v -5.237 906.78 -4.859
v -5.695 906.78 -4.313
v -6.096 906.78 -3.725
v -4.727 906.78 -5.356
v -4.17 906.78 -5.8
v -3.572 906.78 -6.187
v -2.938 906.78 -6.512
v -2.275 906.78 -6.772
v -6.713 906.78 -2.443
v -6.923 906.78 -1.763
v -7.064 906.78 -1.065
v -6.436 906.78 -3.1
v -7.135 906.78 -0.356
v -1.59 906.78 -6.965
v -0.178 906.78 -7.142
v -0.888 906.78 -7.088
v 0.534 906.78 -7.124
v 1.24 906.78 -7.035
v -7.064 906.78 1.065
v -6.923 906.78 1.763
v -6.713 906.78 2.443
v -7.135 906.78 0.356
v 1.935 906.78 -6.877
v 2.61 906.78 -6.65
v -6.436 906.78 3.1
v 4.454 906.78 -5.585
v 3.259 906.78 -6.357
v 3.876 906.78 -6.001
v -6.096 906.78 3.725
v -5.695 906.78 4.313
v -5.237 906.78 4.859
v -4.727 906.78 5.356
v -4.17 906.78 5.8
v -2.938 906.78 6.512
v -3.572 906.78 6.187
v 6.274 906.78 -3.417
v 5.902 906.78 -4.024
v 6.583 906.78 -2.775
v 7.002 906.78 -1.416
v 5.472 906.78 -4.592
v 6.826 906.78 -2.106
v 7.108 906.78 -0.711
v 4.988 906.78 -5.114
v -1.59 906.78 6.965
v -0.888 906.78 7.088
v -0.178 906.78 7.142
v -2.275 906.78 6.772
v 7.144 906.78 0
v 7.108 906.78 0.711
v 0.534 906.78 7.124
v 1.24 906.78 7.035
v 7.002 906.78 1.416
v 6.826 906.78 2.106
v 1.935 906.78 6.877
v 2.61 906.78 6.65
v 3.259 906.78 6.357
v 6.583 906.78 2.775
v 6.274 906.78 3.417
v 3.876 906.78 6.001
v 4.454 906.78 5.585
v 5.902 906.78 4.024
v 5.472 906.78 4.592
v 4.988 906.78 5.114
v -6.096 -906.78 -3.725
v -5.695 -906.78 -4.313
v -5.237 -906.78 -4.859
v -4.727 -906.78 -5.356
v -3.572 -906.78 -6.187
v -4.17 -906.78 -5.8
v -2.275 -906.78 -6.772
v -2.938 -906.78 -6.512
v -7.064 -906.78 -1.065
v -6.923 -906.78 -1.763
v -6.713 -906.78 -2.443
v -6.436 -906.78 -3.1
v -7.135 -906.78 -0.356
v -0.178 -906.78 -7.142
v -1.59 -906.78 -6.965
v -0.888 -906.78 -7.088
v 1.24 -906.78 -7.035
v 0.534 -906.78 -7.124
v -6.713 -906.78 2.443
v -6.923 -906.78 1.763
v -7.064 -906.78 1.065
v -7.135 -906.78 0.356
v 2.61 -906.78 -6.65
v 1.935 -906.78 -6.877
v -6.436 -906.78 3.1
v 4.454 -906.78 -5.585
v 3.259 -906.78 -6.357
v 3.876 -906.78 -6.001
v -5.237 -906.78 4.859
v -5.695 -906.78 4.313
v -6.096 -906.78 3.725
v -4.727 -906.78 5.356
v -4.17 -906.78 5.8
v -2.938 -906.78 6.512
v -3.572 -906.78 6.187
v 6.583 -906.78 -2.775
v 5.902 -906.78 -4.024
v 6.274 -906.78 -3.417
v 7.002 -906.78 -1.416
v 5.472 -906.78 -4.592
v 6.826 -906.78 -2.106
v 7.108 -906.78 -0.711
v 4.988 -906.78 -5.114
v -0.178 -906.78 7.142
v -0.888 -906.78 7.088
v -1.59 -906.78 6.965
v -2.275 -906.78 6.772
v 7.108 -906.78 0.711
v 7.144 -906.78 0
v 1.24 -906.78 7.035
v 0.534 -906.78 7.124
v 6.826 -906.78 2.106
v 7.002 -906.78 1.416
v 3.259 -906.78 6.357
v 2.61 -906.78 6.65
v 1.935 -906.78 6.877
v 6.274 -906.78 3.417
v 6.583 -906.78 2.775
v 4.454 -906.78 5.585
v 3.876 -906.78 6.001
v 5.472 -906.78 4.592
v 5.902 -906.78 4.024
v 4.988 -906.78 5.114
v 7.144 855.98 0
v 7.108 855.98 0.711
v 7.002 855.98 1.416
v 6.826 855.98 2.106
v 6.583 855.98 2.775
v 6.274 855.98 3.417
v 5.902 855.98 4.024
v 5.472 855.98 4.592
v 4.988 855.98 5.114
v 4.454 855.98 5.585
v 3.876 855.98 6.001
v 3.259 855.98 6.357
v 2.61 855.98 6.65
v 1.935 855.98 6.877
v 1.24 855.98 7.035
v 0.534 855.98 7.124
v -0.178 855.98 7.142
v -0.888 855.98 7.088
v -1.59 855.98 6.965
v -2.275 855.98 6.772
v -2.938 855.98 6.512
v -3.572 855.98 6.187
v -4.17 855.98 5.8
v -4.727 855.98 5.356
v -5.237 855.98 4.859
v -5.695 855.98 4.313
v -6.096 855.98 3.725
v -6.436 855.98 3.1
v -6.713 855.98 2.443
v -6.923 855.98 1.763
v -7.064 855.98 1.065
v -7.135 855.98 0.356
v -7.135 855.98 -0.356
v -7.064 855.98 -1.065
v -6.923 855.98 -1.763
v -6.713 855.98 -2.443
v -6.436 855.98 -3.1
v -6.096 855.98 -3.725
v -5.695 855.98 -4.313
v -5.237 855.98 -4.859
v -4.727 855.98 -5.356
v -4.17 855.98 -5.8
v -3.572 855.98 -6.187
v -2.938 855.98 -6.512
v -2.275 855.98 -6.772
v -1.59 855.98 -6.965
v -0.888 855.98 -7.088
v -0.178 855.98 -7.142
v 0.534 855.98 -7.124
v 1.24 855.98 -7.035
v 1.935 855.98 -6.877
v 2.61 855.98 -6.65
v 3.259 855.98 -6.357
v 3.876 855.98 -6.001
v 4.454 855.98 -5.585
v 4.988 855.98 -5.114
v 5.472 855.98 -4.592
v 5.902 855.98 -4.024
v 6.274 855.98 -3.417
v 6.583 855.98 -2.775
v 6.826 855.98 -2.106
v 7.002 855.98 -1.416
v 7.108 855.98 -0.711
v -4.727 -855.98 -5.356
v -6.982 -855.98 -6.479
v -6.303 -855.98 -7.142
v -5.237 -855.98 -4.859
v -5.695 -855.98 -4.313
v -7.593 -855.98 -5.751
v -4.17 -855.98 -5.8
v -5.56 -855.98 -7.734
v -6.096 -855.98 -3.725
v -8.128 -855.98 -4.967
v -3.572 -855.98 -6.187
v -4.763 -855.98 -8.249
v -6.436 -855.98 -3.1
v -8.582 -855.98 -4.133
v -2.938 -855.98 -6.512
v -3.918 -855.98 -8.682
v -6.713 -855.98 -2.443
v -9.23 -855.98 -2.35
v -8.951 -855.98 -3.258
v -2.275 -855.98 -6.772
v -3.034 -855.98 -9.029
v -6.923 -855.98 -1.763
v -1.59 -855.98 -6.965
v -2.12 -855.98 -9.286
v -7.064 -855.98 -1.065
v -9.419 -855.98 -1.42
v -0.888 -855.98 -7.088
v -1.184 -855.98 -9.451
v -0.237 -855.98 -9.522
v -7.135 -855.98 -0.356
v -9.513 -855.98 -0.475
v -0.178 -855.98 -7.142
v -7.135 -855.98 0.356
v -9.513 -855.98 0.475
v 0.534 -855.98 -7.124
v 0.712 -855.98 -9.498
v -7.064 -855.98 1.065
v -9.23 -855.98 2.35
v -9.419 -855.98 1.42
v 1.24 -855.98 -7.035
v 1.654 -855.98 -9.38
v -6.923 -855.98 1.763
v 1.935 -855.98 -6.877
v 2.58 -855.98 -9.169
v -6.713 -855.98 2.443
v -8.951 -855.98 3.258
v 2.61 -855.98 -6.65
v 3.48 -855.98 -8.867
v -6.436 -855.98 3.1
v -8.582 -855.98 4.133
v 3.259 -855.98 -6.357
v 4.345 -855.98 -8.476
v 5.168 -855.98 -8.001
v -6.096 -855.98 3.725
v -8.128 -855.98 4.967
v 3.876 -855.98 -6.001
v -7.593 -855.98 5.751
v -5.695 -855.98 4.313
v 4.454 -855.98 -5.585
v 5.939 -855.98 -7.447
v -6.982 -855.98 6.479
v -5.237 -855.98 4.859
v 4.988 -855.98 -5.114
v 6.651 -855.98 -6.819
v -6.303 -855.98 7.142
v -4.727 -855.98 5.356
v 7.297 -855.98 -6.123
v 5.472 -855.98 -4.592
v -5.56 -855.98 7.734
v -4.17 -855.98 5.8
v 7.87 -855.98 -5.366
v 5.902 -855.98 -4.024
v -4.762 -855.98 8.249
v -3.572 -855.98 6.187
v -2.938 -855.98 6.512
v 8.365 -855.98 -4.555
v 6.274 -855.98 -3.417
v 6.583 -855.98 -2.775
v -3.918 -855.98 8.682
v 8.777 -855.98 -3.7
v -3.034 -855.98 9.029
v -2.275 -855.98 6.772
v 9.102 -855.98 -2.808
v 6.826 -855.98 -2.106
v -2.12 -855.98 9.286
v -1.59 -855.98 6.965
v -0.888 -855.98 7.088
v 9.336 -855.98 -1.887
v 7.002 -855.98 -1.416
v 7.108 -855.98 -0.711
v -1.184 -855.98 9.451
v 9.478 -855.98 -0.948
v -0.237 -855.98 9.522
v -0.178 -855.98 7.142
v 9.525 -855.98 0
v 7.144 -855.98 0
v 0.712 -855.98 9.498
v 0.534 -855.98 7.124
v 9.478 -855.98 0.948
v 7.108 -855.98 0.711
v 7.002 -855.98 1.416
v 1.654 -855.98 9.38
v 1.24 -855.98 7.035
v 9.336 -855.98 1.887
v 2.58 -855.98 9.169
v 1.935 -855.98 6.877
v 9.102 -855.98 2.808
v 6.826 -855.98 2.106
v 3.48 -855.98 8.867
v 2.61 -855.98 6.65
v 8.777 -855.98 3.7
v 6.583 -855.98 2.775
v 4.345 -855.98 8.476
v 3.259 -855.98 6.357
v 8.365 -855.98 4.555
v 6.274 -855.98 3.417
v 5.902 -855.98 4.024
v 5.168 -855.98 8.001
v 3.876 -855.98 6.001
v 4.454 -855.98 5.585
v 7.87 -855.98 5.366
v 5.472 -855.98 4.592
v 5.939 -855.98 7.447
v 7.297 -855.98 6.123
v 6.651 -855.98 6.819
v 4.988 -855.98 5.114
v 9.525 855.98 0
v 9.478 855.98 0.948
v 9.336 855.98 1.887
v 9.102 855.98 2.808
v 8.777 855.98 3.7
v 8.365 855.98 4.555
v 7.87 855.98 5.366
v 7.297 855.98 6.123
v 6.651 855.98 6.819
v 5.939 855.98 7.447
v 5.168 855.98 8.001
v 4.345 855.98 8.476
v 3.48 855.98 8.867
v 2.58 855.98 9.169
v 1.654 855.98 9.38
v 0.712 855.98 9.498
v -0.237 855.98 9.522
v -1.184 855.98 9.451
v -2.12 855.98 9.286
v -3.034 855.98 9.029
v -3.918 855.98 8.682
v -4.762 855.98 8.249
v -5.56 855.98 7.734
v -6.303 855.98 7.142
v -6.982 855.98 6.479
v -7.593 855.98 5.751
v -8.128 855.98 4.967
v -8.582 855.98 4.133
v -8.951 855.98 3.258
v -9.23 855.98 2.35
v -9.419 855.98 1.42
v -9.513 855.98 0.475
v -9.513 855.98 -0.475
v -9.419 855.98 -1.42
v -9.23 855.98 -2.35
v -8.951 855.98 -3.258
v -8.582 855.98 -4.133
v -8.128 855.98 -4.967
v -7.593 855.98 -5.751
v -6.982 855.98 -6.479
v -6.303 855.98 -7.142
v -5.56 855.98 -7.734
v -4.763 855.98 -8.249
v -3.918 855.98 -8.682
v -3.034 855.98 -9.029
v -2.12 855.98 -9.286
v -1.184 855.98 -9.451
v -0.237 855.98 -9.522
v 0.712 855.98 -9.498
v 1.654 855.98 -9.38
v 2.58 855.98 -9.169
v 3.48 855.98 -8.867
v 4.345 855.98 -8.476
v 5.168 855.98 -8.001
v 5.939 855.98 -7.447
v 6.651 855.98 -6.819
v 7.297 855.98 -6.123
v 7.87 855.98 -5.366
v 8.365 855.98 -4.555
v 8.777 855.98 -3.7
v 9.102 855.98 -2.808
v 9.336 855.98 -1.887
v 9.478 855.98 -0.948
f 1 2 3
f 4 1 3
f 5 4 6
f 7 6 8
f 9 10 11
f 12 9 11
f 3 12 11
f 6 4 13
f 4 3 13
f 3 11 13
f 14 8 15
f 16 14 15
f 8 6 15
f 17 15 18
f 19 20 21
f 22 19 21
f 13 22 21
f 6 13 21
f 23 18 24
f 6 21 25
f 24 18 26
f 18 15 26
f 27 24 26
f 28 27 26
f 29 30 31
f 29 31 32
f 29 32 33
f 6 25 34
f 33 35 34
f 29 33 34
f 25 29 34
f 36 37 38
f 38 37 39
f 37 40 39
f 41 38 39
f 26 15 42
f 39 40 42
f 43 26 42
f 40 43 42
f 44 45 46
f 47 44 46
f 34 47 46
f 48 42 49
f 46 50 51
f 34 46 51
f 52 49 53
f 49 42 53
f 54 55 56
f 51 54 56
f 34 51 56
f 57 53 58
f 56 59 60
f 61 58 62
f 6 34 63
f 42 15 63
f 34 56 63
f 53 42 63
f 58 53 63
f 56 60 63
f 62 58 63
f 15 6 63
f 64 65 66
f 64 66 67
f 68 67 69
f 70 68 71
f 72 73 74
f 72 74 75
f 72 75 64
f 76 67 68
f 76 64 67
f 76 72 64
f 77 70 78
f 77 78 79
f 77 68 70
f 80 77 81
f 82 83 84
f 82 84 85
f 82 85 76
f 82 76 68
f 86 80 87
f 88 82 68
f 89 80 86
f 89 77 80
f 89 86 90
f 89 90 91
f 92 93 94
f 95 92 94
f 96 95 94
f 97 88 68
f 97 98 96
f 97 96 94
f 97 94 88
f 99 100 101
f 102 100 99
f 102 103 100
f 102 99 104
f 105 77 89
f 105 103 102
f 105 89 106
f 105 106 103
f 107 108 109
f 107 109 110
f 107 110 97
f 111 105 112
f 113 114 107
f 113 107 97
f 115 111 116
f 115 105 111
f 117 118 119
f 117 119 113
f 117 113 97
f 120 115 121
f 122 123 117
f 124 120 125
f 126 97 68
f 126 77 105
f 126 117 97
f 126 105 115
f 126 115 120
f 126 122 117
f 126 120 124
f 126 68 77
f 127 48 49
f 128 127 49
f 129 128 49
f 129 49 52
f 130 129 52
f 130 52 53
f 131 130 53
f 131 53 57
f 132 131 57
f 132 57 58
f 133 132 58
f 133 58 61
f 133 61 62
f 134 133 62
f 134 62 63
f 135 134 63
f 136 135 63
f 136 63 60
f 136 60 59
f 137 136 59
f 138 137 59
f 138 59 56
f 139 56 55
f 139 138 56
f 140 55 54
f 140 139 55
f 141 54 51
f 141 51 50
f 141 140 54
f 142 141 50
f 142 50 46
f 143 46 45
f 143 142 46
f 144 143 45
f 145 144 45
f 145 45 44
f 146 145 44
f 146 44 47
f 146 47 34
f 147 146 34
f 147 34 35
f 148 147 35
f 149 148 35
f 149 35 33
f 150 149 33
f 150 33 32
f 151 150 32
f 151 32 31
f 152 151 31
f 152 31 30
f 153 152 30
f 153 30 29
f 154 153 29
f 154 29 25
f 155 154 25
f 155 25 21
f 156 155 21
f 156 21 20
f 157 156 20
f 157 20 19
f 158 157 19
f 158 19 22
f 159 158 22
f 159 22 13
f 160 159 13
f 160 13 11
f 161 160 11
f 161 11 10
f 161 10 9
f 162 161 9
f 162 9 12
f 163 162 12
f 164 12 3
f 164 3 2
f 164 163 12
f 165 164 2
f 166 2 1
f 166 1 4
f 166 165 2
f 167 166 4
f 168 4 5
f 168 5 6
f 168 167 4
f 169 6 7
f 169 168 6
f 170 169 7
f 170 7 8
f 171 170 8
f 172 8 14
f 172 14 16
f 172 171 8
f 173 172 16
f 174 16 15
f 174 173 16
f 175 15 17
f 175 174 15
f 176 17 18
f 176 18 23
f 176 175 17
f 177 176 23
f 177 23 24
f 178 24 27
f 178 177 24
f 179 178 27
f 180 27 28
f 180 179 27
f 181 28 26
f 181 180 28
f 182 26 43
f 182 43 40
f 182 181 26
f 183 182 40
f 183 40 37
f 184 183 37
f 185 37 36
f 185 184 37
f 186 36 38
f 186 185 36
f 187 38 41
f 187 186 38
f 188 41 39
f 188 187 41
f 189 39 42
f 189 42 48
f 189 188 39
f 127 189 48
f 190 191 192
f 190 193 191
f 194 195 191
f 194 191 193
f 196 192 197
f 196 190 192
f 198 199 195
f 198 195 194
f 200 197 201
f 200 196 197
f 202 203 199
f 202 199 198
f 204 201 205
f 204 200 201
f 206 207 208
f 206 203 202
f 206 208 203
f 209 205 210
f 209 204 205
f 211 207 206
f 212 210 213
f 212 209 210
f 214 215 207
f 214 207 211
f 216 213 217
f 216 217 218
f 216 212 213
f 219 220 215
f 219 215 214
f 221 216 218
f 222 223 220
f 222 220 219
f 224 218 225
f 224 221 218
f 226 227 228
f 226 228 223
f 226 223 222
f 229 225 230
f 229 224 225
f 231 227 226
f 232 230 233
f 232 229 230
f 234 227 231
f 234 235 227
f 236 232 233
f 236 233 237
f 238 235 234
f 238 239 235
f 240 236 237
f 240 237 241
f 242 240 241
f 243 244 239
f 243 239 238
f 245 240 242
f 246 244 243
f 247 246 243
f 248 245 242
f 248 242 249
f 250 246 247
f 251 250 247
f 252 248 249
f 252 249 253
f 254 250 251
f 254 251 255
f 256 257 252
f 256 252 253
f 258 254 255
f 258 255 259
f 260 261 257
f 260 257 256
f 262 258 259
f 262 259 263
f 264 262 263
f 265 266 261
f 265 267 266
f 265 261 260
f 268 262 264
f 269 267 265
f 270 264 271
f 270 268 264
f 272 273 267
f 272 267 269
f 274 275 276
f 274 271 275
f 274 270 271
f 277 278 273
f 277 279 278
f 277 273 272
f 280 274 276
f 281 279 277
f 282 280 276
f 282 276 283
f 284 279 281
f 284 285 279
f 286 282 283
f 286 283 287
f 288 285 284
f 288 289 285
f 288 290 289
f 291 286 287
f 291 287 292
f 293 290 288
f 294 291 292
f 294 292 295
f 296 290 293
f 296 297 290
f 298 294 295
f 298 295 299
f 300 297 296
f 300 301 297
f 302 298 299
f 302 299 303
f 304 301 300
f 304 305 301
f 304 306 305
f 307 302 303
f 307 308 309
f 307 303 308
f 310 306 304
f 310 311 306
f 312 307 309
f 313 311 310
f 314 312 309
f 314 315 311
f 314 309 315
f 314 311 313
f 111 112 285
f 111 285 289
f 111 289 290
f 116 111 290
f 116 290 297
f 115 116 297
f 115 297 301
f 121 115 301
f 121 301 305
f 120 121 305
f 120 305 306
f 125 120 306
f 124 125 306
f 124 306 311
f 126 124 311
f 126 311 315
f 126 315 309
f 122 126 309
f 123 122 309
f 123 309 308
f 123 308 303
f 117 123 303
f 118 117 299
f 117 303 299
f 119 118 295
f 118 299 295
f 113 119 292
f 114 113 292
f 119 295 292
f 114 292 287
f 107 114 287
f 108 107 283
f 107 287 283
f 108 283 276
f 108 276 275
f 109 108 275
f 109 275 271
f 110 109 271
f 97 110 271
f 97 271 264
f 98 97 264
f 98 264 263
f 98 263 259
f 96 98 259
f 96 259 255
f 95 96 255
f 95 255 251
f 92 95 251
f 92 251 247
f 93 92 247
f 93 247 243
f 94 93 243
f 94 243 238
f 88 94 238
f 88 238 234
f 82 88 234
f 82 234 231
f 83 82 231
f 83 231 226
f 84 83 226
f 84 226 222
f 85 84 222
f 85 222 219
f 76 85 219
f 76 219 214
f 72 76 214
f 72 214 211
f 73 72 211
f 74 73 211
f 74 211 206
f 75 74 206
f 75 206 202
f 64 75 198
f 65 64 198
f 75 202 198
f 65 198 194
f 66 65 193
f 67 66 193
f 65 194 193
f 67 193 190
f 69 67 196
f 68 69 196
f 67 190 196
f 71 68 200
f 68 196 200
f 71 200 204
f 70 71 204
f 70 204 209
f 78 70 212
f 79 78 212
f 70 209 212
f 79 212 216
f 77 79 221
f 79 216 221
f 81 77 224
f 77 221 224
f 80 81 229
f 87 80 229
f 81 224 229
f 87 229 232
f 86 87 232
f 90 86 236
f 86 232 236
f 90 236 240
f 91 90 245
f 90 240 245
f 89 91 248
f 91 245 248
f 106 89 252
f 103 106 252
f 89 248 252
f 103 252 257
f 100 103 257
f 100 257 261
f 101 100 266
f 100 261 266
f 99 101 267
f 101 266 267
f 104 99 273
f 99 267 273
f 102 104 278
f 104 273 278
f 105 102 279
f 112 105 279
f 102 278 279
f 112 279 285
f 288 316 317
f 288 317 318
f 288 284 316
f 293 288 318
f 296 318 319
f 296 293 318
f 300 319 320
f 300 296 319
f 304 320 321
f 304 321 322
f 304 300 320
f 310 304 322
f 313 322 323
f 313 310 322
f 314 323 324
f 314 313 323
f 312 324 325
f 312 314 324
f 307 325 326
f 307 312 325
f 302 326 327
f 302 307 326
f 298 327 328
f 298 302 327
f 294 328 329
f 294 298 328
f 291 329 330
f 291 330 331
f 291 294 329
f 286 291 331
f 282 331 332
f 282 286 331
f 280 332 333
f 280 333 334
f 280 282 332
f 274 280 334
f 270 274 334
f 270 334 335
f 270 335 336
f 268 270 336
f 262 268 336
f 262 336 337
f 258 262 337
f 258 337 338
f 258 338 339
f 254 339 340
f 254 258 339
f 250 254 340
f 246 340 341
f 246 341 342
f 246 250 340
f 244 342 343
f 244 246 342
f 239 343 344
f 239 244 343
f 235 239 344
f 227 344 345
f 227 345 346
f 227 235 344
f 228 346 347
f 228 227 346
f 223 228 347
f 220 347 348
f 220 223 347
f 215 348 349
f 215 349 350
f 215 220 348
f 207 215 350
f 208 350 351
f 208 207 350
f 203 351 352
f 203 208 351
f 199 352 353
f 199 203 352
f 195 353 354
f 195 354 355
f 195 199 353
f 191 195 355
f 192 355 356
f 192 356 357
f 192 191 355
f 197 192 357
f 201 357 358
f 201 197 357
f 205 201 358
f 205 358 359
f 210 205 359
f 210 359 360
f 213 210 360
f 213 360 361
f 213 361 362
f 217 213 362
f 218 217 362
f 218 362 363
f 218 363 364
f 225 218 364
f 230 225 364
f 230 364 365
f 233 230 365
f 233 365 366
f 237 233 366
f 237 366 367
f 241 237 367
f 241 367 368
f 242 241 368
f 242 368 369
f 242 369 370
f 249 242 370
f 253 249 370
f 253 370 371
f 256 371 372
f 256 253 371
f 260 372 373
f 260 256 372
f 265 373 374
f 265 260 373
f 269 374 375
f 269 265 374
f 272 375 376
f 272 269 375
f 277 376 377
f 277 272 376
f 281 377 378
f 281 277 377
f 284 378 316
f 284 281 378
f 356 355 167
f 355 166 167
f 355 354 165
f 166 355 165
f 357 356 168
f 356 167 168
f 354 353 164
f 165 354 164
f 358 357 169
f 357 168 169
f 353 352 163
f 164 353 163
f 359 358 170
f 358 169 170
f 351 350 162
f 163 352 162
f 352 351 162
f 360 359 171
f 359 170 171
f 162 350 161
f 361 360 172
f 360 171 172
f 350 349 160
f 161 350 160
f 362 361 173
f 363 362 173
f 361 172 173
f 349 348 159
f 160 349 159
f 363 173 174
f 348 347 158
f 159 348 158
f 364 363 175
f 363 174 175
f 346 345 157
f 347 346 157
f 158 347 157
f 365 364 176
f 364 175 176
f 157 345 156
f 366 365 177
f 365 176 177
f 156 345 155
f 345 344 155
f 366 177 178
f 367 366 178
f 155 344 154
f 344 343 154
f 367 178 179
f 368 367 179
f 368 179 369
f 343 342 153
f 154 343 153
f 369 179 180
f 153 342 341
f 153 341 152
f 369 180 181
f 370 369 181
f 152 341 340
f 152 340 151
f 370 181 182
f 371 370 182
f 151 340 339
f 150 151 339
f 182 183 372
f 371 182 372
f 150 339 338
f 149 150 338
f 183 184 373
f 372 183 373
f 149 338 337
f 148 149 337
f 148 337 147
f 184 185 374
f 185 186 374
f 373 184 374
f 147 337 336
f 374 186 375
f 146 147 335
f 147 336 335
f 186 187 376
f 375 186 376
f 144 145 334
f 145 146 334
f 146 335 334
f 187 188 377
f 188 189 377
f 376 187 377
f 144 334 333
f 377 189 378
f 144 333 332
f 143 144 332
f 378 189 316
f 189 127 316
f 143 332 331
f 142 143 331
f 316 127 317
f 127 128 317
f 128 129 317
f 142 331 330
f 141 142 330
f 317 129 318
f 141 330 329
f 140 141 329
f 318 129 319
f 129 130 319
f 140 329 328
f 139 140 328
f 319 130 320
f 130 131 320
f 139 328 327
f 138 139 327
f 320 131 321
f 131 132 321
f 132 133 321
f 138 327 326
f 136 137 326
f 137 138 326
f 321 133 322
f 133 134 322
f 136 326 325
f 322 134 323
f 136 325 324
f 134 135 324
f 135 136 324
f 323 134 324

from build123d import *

# Parameters (mm, degrees)
F0_R          = 9.525
F0_R_2        = 7.14375
F1_DEPTH      = 855.98
F1_DEPTH_BACK = 855.98
F2_R          = 7.14375
F3_DEPTH      = 906.78
F3_DEPTH_BACK = 906.78


# Not quite as in the source:
# - a feature names something its author has since deleted; it is built from what else it names


with BuildPart() as f1:
    # F0 (on Front) → F1 (new body, two sides)
    with BuildSketch(Plane.XZ) as f1_sk:
        Circle(F0_R)
        Circle(F0_R_2, mode=Mode.SUBTRACT)
    extrude(amount=F1_DEPTH)
    extrude(f1_sk.sketch, amount=-F1_DEPTH_BACK)

    # F2 (on Front) → F3 (join, two sides)
    with BuildSketch(Plane.XZ) as f3_sk:
        Circle(F2_R)
    extrude(amount=F3_DEPTH)
    extrude(f3_sk.sketch, amount=-F3_DEPTH_BACK)


solid = f1.part
